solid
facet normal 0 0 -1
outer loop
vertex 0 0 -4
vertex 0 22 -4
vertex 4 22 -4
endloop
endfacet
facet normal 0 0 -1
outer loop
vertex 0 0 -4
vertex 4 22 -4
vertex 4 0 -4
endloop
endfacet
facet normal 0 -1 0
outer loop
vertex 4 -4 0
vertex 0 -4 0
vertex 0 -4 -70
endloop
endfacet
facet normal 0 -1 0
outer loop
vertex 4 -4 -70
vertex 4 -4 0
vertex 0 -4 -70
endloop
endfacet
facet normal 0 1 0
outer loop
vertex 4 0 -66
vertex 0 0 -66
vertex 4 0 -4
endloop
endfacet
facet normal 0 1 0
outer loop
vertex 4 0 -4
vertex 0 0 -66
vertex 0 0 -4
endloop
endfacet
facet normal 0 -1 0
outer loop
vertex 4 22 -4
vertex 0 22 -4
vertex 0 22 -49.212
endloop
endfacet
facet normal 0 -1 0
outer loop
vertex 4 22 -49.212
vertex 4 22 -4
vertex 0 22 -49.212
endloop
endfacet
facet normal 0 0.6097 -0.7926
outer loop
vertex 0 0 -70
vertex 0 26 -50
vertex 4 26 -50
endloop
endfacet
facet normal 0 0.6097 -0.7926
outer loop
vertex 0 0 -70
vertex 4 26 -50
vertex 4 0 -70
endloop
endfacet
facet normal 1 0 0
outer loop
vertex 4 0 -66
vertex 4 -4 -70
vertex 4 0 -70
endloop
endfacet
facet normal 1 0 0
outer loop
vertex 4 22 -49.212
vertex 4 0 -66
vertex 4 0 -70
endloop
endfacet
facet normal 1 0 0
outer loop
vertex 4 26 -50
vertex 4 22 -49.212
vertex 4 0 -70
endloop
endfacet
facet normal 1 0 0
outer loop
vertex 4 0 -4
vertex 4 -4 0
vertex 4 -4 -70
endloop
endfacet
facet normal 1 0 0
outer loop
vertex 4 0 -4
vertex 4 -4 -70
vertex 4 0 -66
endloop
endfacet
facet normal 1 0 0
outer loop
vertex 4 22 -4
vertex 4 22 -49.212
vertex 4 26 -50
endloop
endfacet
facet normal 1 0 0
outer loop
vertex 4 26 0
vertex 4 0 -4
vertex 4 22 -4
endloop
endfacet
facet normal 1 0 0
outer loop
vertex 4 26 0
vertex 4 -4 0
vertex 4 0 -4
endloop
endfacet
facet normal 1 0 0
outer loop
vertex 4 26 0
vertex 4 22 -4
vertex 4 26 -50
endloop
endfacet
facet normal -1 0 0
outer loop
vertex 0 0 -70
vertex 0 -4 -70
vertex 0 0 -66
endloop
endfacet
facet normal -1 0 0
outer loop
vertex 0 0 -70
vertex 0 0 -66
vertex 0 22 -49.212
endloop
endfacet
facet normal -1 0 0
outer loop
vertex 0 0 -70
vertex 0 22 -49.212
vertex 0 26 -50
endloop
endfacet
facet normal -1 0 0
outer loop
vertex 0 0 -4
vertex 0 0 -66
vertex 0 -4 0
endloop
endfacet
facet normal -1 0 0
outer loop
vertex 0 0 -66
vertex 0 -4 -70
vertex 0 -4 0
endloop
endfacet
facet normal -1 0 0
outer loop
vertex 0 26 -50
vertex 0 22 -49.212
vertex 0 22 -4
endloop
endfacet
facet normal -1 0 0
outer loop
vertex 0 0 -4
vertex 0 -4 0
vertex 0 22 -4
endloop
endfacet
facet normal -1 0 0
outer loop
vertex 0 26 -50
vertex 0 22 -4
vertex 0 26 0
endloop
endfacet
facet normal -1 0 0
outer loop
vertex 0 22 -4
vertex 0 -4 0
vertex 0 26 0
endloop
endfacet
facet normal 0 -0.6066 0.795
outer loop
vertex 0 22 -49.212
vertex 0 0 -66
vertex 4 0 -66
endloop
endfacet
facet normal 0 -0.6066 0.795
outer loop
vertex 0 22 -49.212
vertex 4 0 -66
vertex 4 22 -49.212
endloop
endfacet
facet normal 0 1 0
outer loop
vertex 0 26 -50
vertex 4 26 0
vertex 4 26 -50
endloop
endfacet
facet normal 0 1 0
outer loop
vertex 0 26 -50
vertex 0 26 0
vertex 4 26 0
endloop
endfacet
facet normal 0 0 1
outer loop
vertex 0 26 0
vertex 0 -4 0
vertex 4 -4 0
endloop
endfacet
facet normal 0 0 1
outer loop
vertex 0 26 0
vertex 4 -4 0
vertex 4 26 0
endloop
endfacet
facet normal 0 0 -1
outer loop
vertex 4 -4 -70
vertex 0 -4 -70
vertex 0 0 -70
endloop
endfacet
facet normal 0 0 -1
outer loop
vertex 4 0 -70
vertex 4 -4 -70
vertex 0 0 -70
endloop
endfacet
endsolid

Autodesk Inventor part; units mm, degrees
ref_plane "YZ Plane" through (0, 0, 0) normal (1, 0, 0) x (0, 1, 0)
ref_plane "XZ Plane" through (0, 0, 0) normal (0, 1, 0) x (-1, 0, 0)
ref_plane "XY Plane" through (0, 0, 0) normal (0, 0, 1) x (1, 0, 0)
sketch "Sketch1" plane through (0, 0, 0) normal (1, 0, 0) x (0, 1, 0)
  line L0 (0, 0) -> (-4, 0)
  line L1 (-4, 0) -> (-4, -70)
  line L2 (-4, -70) -> (0, -70)
  line L3 (0, -70) -> (0, -4)
  line L4 (-4, 0) -> (26, 0)
  line L5 (26, 0) -> (26, -4)
  line L6 (22, -4) -> (0, -4)
  line L7 (-4, -4) -> (-4, 0)
  line L8 (26, 0) -> (22, 0)
  line L9 (22, -4) -> (22, -50)
  line L10 (22, -50) -> (26, -50)
  line L11 (26, -50) -> (26, 0)
  line L12 (26, -50) -> (0, -70)
  line L13 (0, -70) -> (0, -66)
  line L14 (0, -66) -> (22, -49.2125)
  dimension "d0" = 4
  dimension "d1" = 70
  dimension "d2" = 30
  dimension "d3" = 4
  dimension "d4" = 4
  dimension "d5" = 50
  dimension "d6" = 4
extrude "Extrusion1" add sketch "Sketch1" along normal blind 4 contours L4 L5 L11 L10 L9 L6 L3 L2 L1 L0 | L3 L14 L9 L10 L12
properties part number "Holder Motor Lifter_3DPrint"
